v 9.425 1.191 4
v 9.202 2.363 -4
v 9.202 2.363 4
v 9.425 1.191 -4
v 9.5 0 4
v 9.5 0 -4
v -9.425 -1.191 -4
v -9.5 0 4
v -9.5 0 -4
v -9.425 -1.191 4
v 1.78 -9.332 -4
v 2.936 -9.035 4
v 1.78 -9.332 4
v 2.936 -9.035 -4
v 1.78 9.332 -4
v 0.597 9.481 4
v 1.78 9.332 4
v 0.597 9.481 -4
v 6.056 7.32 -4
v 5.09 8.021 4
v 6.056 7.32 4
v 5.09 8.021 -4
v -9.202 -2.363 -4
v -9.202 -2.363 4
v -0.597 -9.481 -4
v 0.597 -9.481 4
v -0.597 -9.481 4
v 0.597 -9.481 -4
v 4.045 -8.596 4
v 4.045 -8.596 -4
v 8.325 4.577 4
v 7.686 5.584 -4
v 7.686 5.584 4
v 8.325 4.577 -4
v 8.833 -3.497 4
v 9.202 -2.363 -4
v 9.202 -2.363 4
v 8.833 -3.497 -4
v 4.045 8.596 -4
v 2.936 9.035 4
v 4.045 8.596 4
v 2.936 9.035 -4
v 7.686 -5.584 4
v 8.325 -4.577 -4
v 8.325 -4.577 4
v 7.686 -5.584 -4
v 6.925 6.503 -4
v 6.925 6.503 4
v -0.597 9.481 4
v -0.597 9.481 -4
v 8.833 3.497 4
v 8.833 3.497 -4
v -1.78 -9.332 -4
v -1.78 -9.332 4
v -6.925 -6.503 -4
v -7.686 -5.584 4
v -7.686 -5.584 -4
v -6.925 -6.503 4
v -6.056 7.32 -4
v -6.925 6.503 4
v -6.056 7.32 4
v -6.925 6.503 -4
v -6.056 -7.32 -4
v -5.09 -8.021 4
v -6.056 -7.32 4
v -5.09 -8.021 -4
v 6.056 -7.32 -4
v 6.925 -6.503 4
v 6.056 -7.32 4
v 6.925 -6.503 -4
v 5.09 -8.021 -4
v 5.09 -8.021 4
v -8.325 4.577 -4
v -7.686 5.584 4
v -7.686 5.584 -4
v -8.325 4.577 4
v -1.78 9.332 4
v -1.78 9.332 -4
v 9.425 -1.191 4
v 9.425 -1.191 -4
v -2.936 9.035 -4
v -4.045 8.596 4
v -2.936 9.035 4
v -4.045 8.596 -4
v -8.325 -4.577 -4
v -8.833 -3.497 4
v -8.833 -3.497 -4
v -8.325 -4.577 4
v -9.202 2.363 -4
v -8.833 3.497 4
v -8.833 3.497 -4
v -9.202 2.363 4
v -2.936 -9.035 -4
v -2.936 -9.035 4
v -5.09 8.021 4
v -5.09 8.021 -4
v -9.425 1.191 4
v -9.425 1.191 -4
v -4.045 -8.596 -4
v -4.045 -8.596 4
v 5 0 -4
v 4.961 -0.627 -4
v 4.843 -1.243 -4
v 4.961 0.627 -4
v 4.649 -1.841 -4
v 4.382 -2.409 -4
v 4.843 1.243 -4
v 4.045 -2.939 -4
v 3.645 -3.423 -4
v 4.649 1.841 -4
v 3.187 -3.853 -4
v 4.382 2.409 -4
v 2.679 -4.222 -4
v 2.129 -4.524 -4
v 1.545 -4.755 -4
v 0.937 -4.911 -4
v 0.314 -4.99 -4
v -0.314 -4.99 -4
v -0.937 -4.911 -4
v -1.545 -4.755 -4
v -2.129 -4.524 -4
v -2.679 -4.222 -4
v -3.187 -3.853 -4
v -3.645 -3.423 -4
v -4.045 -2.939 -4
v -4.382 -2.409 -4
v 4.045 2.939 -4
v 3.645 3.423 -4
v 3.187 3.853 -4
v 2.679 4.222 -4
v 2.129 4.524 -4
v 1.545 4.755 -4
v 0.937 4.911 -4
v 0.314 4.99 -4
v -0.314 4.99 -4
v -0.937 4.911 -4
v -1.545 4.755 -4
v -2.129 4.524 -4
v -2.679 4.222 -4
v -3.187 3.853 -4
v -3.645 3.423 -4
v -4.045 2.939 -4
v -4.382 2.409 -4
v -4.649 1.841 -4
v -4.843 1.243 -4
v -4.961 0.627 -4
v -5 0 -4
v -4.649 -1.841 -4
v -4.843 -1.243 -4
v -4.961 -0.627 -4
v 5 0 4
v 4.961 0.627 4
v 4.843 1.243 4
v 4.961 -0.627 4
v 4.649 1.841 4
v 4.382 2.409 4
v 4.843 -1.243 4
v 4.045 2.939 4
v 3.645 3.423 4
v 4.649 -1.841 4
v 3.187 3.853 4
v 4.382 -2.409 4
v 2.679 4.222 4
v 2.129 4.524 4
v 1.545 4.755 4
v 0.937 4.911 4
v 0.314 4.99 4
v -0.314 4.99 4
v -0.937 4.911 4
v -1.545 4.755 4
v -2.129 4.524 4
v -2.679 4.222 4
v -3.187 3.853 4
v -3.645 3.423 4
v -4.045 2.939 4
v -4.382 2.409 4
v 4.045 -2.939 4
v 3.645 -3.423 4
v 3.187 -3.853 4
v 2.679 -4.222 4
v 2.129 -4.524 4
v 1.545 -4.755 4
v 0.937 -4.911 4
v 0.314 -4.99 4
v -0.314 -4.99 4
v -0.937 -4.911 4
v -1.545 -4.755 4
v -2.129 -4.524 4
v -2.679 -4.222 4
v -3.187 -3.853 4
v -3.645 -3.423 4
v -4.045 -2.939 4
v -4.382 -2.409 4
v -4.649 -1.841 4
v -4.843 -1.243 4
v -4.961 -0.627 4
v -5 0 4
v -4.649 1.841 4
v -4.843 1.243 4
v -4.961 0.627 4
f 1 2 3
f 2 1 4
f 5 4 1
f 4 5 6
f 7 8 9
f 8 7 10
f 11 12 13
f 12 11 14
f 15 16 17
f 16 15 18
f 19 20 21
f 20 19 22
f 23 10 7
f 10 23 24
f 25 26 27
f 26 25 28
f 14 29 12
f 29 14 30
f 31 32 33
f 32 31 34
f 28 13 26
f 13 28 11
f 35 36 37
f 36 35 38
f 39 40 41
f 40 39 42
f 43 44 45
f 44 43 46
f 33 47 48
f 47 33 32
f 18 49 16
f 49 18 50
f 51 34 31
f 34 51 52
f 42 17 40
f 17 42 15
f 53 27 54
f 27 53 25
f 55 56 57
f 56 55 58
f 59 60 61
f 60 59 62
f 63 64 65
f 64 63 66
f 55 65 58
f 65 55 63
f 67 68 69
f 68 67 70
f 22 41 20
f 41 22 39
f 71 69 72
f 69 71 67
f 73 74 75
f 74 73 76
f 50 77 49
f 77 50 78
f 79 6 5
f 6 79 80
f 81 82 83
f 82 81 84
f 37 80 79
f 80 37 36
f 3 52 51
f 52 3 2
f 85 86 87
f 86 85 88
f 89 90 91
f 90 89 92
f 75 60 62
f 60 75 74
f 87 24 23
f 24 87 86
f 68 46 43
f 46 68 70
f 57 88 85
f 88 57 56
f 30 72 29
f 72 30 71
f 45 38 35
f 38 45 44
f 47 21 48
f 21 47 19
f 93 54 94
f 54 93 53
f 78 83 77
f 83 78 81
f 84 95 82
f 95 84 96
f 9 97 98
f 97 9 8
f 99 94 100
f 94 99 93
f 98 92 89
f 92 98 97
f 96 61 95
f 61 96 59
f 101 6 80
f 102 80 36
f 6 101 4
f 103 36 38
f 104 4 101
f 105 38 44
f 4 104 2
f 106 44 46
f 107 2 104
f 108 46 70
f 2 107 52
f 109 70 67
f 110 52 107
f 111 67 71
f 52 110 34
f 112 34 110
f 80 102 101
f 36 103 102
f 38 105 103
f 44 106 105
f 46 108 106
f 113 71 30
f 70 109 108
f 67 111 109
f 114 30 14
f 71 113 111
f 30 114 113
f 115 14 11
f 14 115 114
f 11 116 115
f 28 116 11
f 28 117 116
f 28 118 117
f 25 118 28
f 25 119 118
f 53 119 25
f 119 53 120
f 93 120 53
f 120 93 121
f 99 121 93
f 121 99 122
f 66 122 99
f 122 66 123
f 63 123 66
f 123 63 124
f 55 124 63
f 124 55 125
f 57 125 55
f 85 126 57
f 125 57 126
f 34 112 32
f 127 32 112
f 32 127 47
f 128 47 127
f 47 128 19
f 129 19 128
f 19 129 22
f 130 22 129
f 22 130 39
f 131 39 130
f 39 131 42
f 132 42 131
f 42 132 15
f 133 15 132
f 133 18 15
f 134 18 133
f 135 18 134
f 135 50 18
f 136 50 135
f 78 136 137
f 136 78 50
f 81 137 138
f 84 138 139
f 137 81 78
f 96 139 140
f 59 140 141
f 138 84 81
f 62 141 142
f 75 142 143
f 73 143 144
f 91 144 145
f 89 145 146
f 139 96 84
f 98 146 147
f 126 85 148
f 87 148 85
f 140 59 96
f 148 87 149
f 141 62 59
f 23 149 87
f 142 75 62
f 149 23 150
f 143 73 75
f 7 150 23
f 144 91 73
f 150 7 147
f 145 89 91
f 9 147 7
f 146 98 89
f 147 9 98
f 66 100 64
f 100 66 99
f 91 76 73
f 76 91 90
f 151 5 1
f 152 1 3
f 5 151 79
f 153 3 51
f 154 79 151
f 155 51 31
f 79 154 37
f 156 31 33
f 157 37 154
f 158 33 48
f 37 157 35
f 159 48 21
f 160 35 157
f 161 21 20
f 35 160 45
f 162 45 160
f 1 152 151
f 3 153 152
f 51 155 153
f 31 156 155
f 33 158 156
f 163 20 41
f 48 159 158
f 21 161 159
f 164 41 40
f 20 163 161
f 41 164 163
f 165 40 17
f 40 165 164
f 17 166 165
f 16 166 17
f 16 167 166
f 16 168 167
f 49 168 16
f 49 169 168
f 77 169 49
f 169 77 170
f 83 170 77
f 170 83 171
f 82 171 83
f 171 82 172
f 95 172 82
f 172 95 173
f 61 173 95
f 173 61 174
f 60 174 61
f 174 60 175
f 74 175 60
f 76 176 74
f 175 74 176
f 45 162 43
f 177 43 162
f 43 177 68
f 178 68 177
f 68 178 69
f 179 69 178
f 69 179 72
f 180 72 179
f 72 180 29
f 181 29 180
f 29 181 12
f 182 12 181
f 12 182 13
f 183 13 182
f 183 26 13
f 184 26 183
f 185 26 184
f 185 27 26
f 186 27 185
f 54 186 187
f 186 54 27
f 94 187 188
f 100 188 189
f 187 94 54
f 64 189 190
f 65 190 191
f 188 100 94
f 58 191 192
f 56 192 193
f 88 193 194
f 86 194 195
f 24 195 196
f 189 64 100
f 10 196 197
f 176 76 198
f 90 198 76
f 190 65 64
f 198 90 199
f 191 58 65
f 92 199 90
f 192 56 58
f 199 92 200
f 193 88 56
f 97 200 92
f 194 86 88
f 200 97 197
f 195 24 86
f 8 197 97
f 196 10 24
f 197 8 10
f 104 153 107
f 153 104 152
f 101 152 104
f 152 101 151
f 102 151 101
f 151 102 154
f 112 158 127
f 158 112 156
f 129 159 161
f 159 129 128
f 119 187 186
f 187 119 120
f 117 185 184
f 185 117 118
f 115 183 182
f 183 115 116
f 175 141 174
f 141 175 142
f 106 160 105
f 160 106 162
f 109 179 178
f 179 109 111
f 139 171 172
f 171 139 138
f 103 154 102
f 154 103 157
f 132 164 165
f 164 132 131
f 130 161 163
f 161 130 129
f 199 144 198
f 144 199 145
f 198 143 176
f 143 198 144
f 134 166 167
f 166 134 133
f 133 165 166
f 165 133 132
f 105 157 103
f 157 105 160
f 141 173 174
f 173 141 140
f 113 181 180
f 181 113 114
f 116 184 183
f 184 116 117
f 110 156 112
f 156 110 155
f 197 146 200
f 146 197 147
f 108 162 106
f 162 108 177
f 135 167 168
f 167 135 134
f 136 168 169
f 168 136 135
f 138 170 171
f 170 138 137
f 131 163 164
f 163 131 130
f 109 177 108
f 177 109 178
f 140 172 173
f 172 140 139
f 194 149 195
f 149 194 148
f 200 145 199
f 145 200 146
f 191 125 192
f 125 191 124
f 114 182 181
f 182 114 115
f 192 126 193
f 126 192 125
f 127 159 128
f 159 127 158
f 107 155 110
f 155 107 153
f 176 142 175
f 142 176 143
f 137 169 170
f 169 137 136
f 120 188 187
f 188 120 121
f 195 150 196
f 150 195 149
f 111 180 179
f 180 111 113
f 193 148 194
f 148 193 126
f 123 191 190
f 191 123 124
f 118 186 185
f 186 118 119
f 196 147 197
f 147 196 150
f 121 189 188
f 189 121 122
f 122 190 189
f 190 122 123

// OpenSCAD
$fn = 50;


difference() {
	union() {
		translate(v = [0, 0, -4.0000000000]) {
			cylinder(h = 8, r = 9.5000000000);
		}
	}
	union() {
		translate(v = [0, 0, -100.0000000000]) {
			cylinder(h = 200, r = 5.0000000000);
		}
	}
}
